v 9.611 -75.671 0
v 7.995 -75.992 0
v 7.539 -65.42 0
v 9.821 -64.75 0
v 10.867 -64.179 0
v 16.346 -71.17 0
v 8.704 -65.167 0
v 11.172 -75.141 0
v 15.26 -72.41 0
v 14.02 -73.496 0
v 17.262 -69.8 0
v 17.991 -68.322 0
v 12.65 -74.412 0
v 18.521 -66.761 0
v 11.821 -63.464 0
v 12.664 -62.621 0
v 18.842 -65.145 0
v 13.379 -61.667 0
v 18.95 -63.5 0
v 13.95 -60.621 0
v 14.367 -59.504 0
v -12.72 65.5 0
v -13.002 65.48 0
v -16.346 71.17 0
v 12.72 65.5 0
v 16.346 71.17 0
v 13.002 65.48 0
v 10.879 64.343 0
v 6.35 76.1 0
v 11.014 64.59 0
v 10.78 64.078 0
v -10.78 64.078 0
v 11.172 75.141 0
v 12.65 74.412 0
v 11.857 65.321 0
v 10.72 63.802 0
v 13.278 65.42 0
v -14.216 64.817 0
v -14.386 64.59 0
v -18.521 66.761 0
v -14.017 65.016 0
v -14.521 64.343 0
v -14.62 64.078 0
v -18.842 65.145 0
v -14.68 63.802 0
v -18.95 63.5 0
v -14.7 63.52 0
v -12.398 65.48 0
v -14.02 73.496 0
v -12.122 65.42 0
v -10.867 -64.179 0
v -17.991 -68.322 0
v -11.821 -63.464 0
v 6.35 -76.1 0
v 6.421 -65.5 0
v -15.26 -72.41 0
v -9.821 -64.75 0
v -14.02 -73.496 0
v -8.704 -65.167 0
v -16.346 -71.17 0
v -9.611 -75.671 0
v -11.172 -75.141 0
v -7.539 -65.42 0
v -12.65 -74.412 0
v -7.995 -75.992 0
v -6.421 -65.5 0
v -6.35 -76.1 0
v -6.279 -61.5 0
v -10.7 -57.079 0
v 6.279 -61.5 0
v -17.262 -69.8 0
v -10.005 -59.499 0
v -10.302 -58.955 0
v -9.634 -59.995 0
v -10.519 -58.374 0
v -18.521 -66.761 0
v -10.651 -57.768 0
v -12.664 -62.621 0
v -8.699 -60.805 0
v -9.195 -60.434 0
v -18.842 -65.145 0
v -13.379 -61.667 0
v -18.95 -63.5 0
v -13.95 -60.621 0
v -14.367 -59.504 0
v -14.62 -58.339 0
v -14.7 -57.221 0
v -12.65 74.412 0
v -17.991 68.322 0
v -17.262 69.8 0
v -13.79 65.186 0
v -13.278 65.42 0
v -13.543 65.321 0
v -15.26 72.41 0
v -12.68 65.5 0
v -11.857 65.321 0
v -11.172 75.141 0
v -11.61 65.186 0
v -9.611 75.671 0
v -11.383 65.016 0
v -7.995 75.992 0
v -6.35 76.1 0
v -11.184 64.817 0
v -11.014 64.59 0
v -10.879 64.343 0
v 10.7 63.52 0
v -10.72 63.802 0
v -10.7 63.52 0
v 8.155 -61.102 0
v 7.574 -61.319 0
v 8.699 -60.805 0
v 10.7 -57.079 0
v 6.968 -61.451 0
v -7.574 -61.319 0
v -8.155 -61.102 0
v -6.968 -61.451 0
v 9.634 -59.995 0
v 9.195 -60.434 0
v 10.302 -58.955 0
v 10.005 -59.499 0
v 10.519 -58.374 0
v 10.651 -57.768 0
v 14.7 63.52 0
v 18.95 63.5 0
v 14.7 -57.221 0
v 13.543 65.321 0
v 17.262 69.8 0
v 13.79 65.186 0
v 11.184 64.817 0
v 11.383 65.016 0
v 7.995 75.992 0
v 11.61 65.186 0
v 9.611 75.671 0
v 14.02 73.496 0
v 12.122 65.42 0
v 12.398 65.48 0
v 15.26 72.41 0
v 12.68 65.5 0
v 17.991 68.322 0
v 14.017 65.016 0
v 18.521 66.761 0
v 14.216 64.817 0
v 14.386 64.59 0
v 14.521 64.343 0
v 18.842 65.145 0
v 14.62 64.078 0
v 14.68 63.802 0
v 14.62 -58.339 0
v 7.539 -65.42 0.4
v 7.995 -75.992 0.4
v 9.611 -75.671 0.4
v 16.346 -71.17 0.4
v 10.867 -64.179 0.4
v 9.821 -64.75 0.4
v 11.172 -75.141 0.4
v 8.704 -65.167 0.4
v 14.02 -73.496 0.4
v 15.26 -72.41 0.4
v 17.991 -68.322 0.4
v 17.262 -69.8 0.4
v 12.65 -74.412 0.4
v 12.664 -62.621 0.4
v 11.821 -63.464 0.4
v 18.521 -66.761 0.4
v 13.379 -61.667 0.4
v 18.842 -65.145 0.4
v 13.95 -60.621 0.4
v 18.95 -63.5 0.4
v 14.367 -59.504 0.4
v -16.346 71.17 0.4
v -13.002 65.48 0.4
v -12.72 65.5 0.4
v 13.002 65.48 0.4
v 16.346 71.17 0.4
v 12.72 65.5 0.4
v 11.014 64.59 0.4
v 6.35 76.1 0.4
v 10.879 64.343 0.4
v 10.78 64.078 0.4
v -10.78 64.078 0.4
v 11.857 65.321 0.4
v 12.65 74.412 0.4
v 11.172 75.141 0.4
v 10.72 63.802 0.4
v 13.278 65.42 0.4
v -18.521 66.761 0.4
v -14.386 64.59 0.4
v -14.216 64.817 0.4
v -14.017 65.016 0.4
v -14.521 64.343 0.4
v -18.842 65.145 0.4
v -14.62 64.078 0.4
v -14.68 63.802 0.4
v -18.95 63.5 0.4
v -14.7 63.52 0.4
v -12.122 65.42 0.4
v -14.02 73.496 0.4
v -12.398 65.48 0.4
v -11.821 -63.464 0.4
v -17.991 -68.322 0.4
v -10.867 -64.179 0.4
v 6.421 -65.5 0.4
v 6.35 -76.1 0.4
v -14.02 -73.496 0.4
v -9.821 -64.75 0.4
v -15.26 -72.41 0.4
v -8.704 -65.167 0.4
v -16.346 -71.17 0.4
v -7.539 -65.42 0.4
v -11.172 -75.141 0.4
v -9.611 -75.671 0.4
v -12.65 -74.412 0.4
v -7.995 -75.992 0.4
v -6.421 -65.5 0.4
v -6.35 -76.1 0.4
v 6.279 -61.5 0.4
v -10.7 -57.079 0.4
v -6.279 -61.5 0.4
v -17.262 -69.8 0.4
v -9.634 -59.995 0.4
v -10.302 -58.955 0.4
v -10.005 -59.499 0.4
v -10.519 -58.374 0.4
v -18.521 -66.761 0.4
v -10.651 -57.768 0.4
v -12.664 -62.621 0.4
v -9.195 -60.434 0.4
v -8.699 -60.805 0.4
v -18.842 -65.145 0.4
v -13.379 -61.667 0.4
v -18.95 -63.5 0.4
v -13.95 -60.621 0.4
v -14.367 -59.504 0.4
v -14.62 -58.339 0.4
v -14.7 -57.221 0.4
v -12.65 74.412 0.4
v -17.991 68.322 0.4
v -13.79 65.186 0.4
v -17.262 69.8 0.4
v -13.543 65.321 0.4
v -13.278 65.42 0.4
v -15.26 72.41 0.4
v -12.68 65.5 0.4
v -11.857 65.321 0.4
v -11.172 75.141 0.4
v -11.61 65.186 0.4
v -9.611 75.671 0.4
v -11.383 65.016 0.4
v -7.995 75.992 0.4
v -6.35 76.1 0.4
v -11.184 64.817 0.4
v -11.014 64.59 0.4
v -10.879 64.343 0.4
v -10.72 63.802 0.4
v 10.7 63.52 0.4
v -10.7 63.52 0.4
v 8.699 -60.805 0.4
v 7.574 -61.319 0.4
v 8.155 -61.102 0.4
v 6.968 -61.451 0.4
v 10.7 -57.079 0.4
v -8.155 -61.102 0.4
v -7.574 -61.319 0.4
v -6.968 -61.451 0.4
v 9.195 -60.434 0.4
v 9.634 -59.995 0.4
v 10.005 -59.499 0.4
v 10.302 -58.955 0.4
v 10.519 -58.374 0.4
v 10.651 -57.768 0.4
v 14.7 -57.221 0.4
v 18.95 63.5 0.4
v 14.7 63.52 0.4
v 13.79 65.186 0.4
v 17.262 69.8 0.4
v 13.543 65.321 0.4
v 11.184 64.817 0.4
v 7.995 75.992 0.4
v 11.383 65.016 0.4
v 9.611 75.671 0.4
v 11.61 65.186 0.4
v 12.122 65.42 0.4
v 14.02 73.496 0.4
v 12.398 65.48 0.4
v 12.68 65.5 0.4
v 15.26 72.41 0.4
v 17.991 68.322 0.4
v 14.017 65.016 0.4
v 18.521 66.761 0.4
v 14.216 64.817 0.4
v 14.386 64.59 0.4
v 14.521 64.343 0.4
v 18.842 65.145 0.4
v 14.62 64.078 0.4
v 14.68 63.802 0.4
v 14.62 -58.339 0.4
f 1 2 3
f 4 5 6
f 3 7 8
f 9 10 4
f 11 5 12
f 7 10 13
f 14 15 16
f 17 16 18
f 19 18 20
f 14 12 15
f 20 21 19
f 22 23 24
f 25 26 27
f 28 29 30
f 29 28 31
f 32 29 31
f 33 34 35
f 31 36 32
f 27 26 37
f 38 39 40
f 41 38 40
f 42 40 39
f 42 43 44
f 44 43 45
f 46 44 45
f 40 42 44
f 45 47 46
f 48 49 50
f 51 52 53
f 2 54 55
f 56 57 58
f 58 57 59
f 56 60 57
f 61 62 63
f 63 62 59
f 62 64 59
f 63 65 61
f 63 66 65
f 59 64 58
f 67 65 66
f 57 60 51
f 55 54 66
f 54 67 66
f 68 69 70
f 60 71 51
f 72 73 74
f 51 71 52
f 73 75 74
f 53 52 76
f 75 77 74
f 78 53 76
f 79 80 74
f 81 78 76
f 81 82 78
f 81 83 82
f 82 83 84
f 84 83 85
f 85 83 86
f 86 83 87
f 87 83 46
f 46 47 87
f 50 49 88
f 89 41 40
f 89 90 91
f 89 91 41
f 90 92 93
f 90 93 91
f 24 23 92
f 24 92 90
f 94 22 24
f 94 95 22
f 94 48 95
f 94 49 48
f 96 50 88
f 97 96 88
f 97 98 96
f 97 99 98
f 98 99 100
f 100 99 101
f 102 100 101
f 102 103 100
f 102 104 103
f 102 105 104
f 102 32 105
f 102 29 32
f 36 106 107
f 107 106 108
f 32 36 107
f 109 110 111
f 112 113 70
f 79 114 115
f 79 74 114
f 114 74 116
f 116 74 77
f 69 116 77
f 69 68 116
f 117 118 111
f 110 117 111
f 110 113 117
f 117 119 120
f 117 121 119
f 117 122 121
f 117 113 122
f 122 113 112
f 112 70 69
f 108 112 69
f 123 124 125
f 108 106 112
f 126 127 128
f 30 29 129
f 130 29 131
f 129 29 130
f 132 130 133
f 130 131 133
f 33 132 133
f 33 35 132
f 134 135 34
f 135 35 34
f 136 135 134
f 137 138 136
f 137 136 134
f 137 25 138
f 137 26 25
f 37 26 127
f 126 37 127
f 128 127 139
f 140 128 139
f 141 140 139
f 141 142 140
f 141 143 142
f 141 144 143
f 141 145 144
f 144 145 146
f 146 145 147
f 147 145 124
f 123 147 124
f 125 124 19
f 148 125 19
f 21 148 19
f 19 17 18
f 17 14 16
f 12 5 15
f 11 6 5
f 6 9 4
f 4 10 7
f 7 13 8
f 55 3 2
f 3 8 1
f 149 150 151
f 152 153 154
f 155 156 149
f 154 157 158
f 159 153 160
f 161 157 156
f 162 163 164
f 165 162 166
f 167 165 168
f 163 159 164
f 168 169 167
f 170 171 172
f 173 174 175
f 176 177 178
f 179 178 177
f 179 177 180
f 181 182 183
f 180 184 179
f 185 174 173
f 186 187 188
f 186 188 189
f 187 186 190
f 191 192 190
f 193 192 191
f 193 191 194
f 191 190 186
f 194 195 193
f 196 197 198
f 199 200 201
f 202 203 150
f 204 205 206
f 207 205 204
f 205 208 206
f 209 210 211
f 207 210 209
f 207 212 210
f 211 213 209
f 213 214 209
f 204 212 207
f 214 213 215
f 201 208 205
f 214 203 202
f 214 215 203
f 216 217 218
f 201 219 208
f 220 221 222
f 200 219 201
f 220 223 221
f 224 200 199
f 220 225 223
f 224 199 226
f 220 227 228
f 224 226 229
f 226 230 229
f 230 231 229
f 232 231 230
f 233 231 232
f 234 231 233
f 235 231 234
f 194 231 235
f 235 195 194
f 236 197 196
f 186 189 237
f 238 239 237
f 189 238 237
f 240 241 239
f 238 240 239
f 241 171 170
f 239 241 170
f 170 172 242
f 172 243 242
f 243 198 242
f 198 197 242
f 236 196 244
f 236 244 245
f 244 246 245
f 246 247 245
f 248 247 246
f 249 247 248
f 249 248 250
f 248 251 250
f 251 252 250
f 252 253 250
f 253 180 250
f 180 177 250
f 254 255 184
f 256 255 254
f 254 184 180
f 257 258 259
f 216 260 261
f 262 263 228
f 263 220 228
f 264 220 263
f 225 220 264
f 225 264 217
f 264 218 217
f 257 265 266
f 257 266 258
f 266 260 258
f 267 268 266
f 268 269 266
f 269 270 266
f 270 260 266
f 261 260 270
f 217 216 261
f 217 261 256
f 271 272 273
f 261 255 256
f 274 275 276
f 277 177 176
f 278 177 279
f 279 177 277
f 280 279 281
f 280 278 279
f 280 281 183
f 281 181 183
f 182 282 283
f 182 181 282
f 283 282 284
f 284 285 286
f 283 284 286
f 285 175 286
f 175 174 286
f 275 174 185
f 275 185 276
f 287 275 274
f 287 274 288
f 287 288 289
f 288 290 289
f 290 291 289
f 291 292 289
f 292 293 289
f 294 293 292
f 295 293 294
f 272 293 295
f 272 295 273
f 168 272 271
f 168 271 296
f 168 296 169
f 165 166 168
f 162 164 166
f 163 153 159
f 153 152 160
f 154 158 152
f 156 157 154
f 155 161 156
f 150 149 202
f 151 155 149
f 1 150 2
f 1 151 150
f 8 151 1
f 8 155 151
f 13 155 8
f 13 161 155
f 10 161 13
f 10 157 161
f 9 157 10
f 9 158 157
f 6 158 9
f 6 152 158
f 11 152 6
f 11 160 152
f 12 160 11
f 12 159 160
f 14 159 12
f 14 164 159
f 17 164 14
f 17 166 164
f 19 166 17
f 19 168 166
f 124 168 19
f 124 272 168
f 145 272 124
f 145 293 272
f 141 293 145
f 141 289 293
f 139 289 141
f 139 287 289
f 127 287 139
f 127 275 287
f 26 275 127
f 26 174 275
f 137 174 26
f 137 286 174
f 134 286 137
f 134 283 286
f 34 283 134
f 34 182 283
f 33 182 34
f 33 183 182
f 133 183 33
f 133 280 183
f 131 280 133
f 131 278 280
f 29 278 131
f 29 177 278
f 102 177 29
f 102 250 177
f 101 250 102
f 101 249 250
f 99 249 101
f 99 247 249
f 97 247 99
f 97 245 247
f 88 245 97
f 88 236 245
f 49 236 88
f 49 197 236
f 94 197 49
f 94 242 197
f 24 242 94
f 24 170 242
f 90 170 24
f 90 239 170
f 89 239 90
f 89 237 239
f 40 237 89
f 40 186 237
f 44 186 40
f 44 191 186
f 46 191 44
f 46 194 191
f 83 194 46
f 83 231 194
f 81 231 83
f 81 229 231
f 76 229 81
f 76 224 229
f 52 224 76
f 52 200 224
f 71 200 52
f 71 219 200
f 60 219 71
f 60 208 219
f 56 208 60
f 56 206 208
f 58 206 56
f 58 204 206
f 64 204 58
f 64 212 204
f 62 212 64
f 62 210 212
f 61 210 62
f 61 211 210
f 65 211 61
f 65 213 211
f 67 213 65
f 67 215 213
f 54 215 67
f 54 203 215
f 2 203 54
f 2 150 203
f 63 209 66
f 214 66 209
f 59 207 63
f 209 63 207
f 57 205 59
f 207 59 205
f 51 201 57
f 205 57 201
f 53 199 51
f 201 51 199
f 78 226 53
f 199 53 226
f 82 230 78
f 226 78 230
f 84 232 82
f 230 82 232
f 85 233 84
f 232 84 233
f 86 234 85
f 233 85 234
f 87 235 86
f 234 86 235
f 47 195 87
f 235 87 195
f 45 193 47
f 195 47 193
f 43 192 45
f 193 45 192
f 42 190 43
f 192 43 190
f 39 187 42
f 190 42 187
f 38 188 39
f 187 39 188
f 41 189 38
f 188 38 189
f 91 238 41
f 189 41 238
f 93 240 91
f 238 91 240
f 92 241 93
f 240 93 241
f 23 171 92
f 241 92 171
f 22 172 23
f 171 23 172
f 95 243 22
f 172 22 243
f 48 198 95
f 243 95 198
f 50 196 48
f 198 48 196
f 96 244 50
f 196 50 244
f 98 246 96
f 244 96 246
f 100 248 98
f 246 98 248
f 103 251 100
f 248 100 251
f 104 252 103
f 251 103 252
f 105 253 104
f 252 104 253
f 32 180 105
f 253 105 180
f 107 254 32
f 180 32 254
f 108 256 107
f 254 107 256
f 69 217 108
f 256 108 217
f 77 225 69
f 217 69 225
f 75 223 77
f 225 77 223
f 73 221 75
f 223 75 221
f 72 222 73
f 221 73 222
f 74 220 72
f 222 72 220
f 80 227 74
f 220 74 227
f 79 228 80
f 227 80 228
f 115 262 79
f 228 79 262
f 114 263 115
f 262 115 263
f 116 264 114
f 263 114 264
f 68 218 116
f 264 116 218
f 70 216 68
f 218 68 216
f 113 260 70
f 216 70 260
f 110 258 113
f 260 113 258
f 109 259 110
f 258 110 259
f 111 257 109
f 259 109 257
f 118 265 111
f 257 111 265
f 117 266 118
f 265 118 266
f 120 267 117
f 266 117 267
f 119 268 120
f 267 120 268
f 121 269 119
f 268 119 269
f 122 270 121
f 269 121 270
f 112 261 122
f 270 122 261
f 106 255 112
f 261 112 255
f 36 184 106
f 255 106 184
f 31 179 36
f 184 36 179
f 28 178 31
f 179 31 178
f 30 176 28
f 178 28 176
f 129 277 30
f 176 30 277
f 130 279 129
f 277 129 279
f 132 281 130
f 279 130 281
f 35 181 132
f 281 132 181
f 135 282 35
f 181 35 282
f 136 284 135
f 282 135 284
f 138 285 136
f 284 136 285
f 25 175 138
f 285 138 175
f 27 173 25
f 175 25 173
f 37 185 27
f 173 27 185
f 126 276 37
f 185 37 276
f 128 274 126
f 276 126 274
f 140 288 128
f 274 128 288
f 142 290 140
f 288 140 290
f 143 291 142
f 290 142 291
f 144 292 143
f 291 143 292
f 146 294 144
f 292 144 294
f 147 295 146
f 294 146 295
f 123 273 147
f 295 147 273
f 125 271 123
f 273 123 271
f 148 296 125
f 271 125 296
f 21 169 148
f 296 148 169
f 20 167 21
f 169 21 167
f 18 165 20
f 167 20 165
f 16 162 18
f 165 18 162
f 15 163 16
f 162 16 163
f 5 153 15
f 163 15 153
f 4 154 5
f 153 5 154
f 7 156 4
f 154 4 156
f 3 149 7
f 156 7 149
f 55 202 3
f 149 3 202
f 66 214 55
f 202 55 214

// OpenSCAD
// file: ../lib/TOGUnitTable-v1.scad
// TOGUnitTable-v1.1.0 - Library for handling 'complex amounts' in the form of [multiplier, unit name], e.g. [1.5, "inch"]
//
// 2023-07-01: the following 'annotation' is something I just made up,
// but is intended as a way for future packaging tools to know that it's 'safe'
// (because everything has been somewhat namespaced) to turn a `use <x>`
// into an `include <x>`, making it inlinable:
// safe-to-include: true
// 
// Versions:
// v1.0.0:
// - Created it.
// v1.1.0:
// - Add optional 'dbgctxstr' parameter to unit decoding functions, for better error messages
// 
// Naming convention:
// Doing 'OO without classes', here.
// Fully qualified name = class or package name + "__" + member name
// Class or package name may itself be namespaced, and class names may double as package names.
// Here, tog_unittable names both a class and a package.

// Demo unit table uses 'micrometer' as the base unit
// in order to keep multipliers as integers as much as possible.
tog_unittable__demo_unit_table = [
	["um",    [    1   ,   "um"], "micrometer" ],
	["mm",    [ 1000   ,   "um"], "millimeter" ],
	["inch",  [25400   ,   "um"], "inch"       ],
	["u",     [    1/16, "inch"], "model unit" ], // As used by TGx9 et al
	["atom",  [    8   ,    "u"], "model atom" ],
	["chunk", [    3   , "atom"], "model chunk"],
];

use <./DbgCtxStrLib1.scad>

function tog_unittable__list__filter(list, predicate) = [
	for( item=list ) if( predicate(item) ) item
];
function tog_unittable__list__first(list, on_error) =
	len(list) > 0 ? list[0] : on_error();

function tog_unittable__unit_value_ca(unit_table, unit_name, dbgctxstr=undef) =
	tog_unittable__list__first(
		tog_unittable__list__filter(unit_table, function (entry) entry[0] == unit_name),
		function () assert(false,
			str("Did not find entry for unit '", unit_name, "' in unit table", dbgctxstr_errmsg_suffix(dbgctxstr))
		)
	)[1];

function tog_unittable__ca__is_valid( ca ) =
	is_list(ca) && len(ca) == 2;

// Break down 'amount' until it is in a base unit (one which is defined in terms of itself)
function tog_unittable__simplify_ca(unit_table, amount, dbgctxstr=undef) =
	assert( tog_unittable__ca__is_valid(amount), str(amount, " is not a valid Complex Amount (should be [numeric_value, \"unit_name\"])", dbgctxstr=dbgctxstr) )
	let( unit_value_ca = tog_unittable__unit_value_ca(unit_table, amount[1], dbgctxstr=dbgctxstr) )
	unit_value_ca[1] == amount[1] ? amount :
		tog_unittable__simplify_ca(unit_table, [amount[0] * unit_value_ca[0], unit_value_ca[1]]);

function tog_unittable__divide_ca(unit_table, numerator, denominator, dbgctxstr=undef) =
	let(
		numerator_base_ca   = tog_unittable__simplify_ca(unit_table, numerator, dbgctxstr=dbgctxstr),
		denominator_base_ca = tog_unittable__simplify_ca(unit_table, denominator, dbgctxstr=dbgctxstr)
	)
	assert(numerator_base_ca[1] == denominator_base_ca[1], str("Different base units found for ", numerator[1], " and ", denominator[1]))
	numerator_base_ca[0] / denominator_base_ca[0];	

assert(tog_unittable__divide_ca(tog_unittable__demo_unit_table, [1,   "mm"], [  1, "mm"]) ==     1   );
assert(tog_unittable__divide_ca(tog_unittable__demo_unit_table, [1,   "mm"], [  1, "um"]) ==  1000   );
assert(tog_unittable__divide_ca(tog_unittable__demo_unit_table, [1, "inch"], [  1, "um"]) == 25400   );
assert(tog_unittable__divide_ca(tog_unittable__demo_unit_table, [1, "inch"], [  1, "mm"]) ==    25.4 );
assert(tog_unittable__divide_ca(tog_unittable__demo_unit_table, [1, "inch"], [254, "um"]) ==   100   );
assert(tog_unittable__divide_ca(tog_unittable__demo_unit_table, [1,    "u"], [  1, "um"]) ==  1587.5 );
// file: ../lib/TOGStringLib1.scad
// TOGStringLib1.7
// 
// Functions for parsing quantities
// and other misc. string handling.
// 
// v1.5
// - togstr1_parse_quantity will treat unit-only strings as meaning 1/1 of that unit.
//   e.g. togstr1_parse_quantity("foot") = [[[1,1], "foot", 4]]
// v1.6:
// - togstr1_parse_quantity allows unit name to be omitted when quantity is zero and $togunits1_default_unit is defined
// v1.7:
// - Add optional 'dbgctxstr' parameter to unit decoding functions, for better error messages
// 
// Globals: $togunits1_default_unit - affects what 'unit' is returned
// when interpreting numbers or strings that lack the unit.


function togstr1__todo(message) = assert(false, str("TODO: ", message));

module togstr1__assert_eq(a, b) {
	if( a != b ) {
		assert( a == b, str(a, " != ", b) );
	}
}



function togstr1_slice(source, i0, i1) =
	i0 == i1 ? "" :
	str(source[i0], togstr1_slice(source, i0+1, i1));

function togstr1_tokenize(source, sep, maxcount=9999, i=0, tokenstart=0) =
	len(source) == i ? (
		(tokenstart < i) ? [togstr1_slice(source, tokenstart, i)] : []
	) :
	source[i] == sep ? (
		(tokenstart < i) ? concat([togstr1_slice(source, tokenstart, i)], togstr1_tokenize(source, sep, maxcount-1, i+1, i+1)) :
		togstr1_tokenize(source, sep, maxcount, i+1, i+1)
	) :
	maxcount <= 1 ? [togstr1_slice(source, tokenstart, len(source))] :
	togstr1_tokenize(source, sep, maxcount, i+1, tokenstart);

togstr1__assert_eq( ["foo","bar","baz"], togstr1_tokenize("foo-bar-baz", "-") );
// Duplicate delimiters are ignored
togstr1__assert_eq( ["foo","bar","baz"], togstr1_tokenize("foo--bar--baz", "-") );
// Trailing delimiters are ignored
togstr1__assert_eq( ["foo","bar","baz"], togstr1_tokenize("foo--bar--baz--", "-") );
// Leading delimiters are ignored
togstr1__assert_eq( ["foo","bar","baz"], togstr1_tokenize("--foo--bar--baz", "-") );
// Can limit number of tokens returned
togstr1__assert_eq( ["foo","bar-baz"], togstr1_tokenize("foo-bar-baz", "-", 2) );
togstr1__assert_eq( ["foo","bar-baz"], togstr1_tokenize("--foo--bar-baz", "-", 2) );
togstr1__assert_eq( ["foo","bar--baz"], togstr1_tokenize("--foo--bar--baz", "-", 2) );
togstr1__assert_eq( ["foo"], togstr1_tokenize("--foo--", "-", 2) );




/** \d+ -> [num, end_index] */
function togstr1_parse_decimal_nat(str, index=0, current=0, dbgctxstr=undef) =
	len(str) == index ? [current, index] :
	let( dig = ord(str[index]) - ord("0") )
	(dig >= 0 && dig <= 9) ? togstr1_parse_decimal_nat(str, index+1, current*10 + dig, dbgctxstr=dbgctxstr) :
	[current, index];

togstr1__assert_eq( [123,3], togstr1_parse_decimal_nat("123") );
togstr1__assert_eq( [123,3], togstr1_parse_decimal_nat("123.45") );

/** [+-]*\d+ ->  [[num, den], end_index] */
function togstr1_parse_decimal_number(str, index=0, dbgctxstr=undef) =
	str[index] == "+" ? togstr1_parse_decimal_number(str, index+1) :
	str[index] == "-" ? let(r=togstr1_parse_decimal_number(str, index+1)) [[-r[0][0], r[0][1]], r[1]] :
	let(r = togstr1_parse_decimal_nat(str, index, dbgctxstr=dbgctxstr))
	str[r[1]] != "." ? [[r[0], 1], r[1]] :
	let(fracr = togstr1_parse_decimal_nat(str, r[1]+1))
	let(mult = pow(10, fracr[1]-(r[1]+1)))
	[[r[0]*mult + fracr[0], mult], fracr[1]];

togstr1__assert_eq( [[   36,   1], 2], togstr1_parse_decimal_number( "36"   ) );
togstr1__assert_eq( [[ 3524, 100], 5], togstr1_parse_decimal_number( "35.24") );
togstr1__assert_eq( [[-3524, 100], 6], togstr1_parse_decimal_number("-35.24") );
togstr1__assert_eq( [[    0,   1], 0], togstr1_parse_decimal_number( "NotANumber") );

function togstr1__gcd(a, b) = b == 0 ? abs(a) : togstr1__gcd(b, a % b);

togstr1__assert_eq(10, togstr1__gcd(10, 20));
togstr1__assert_eq( 5, togstr1__gcd(10, 15));
togstr1__assert_eq( 2, togstr1__gcd(10, 14));


function togstr1__normalize_rat(rat) =
	let(gcd = togstr1__gcd(rat[0], rat[1]))
	// TODO: find LCD, divide top and bottom by it
	rat[0] < 0 && rat[1] < 0 ? [-rat[0]/gcd, -rat[1]/gcd] :
	[rat[0]/gcd, rat[1]/gcd];

/** <decnum>[/<decnum>] -> [[num, den], end_index] */
function togstr1__multiply_rat(a, b) =
	togstr1__normalize_rat(
		a[1] == b[1] ? [a[0]*b[0]/a[1], a[1]] : // TODO: LCD instead of special case
		[a[0]*b[0], a[1]*b[1]]
	);
function togstr1__divide_rat(a, b) = togstr1__normalize_rat([a[0]*b[1], a[1]*b[0]]);


function togstr1__add_rat(a, b) =
	togstr1__normalize_rat([a[0]*b[1] + b[0]*a[1], a[1]*b[1]]);
	
togstr1__assert_eq([1, 2], togstr1__add_rat([1, 3], [1, 6]));


/** Return [[num, den], end_index] */
function togstr1_parse_rational_number(str, index=0, dbgctxstr=undef) =
	let( numr = togstr1_parse_decimal_number(str, index, dbgctxstr=dbgctxstr) )
	str[numr[1]] == "+" ?
		let(numrb = togstr1_parse_rational_number(str, numr[1]+1, dbgctxstr=dbgctxstr))
		[togstr1__add_rat(numr[0], numrb[0]), numrb[1]]	:
	str[numr[1]] == "/" ?
		let( denr = togstr1_parse_decimal_number(str, numr[1]+1, dbgctxstr=dbgctxstr) )
		[togstr1__divide_rat(numr[0], denr[0]), denr[1]] :
	numr;

togstr1__assert_eq( [[   123,  1],3], togstr1_parse_rational_number( "123") );
togstr1__assert_eq( [[   123,  1],4], togstr1_parse_rational_number("+123") );
togstr1__assert_eq( [[-  123,  1],4], togstr1_parse_rational_number("-123") );
togstr1__assert_eq( [[   123,  1],6], togstr1_parse_rational_number("-+-123") );
togstr1__assert_eq( [[ 12345,100],6], togstr1_parse_rational_number("123.45") );
togstr1__assert_eq( [[  2469, 40],8], togstr1_parse_rational_number("123.45/2") );
togstr1__assert_eq( [[-  823,160],10], togstr1_parse_rational_number("-123.45/24") );
togstr1__assert_eq( [[     4,  3],5], togstr1_parse_rational_number( "1+1/3") );
togstr1__assert_eq( [[     0,  1],0], togstr1_parse_rational_number( "NotANumber!!") );


/** Return [[[num, den], unit], end_index] */
function togstr1_parse_quantity(str, dbgctxstr=undef) =
	let( numr = togstr1_parse_rational_number(str, dbgctxstr=dbgctxstr) )
	// For now, just let the unit be the rest of the string;
	// can revisit to stop at delimiters if needed in the future.
	numr[1] > 0 && numr[1] == len(str) && numr[0][0] == 0 && !is_undef($togunits1_default_unit) ? [[[0,1], $togunits1_default_unit], numr[1]] :
	assert( numr[1] < len(str), str("Quantity string missing unit: '", str, "'; note that '0' is acceptable if $togunits1_default_unit is defined"))
	let( unit = togstr1_slice(str, numr[1], len(str)) )
	let( quant = numr[1] > 0 ? numr[0] : [1,1] ) // No number = 1 (possibly this should be an error instead)
	[[quant, unit], len(str)];

togstr1__assert_eq( [[[  3,  1], "acre"],  5], togstr1_parse_quantity("3acre") );
togstr1__assert_eq( [[[  3,  5], "acre"],  7], togstr1_parse_quantity("3/5acre") );
togstr1__assert_eq( [[[301,500], "acre"], 10], togstr1_parse_quantity("3.01/5acre") );
togstr1__assert_eq( [[[  1,  1], "acre"],  4], togstr1_parse_quantity("acre") ); // Should either treat as one or throw an error!
togstr1__assert_eq( [[[  0,  1],"hectare"],1], togstr1_parse_quantity("0", $togunits1_default_unit="hectare") ); // Zero is fine if $togunits1_default_unit is defined
// file: ../lib/TOGridLib3.scad
// TOGridPileLib-v3.4
// 
// HOKAY WHAT ARE THE COMMON
// things that I want the library to do?
// 
// - [X] Be `include`-able, to make inlining easy
// - [X] Allow unit table to be overridden easily, but default by default
// - [ ] Support common configurations by name (e.g. "V9", or some "WSTYPE-...")
//   without having to pass 50 different parameters in
// - [ ] Support subtractions for those common configurations also,
//   such that you don't need to remember to 'do less rounding', etc.
// - [ ] Make a simple foot-only block that I can subtract stuff from
//   params: foot style
// - [ ] Make a block with a lip
// - [ ] Make a block foot, and I'll intersect it with some other things
// - [X] Translate a block_size_ca to mm
// 
// Changes:
// v3.1:
// - s/togridpile3_decode_size/togridpile3_decode_vector/
// v3.2:
// - togridpile3_decode(num) = num
// v3.3:
// - Change prefix from `togridpile3` to `togridlib3`
// v3.4:
// - Add optional 'dbgctxstr' parameter to unit decoding functions, for better error messages

use <../lib/TOGUnitTable-v1.scad>

function togridlib3_map(arr, fn) = [ for(item=arr) fn(item) ];

togridlib3_default_unit_table = [
	["um",    [    1,               "um"]],
	["mm",    [ 1000,               "um"]],
	["inch",  [25400,               "um"]],
	["u",     [    1.5875,          "mm"]],
	["atom",  [    8,                "u"]],
	["chunk", [    3,             "atom"]],
	["tgp-standard-bevel"   , [2,    "u"]], // Usuually 1/8"
	["m-outer-corner-radius", [4,    "u"]],
	["f-outer-corner-radius", [3,    "u"]],
];

function togridlib3_get_default_unit_table() = togridlib3_default_unit_table;
function togridlib3_get_unit_table() = is_undef($togridlib3_unit_table) ? togridlib3_default_unit_table : $togridlib3_unit_table;

function togridlib3_decode(dim, unit=[1, "mm"], unit_table=togridlib3_get_unit_table(), dbgctxstr=undef) =
	is_num(dim) ? dim : tog_unittable__divide_ca(unit_table, dim, unit, dbgctxstr=dbgctxstr);
function togridlib3_decode_vector(size, unit=[1, "mm"], unit_table=togridlib3_get_unit_table(), dbgctxstr=undef) =
	togridlib3_map(size, function(dim) is_num(dim) ? dim : tog_unittable__divide_ca(unit_table, dim, unit, dbgctxstr=dbgctxstr));

module togridlib3_cube(size, offset=0) {
	cube(togridlib3_decode_vector(size), center=true);
}
// file: ../lib/DbgCtxStrLib1.scad
// DbgCtxStrLib1.0
// 
// Library for dealing with 'debug context strings' (usually 'dbgctxstr').

function dbgctxstr_errmsg_suffix(dbgctxstr) =
	is_undef(dbgctxstr) || dbgctxstr == "" ? "" :
	str(" (", dbgctxstr, ")");
// file: ../lib/TOGComplexLib1.scad
function tcplx1_multiply(a, b) =
	[a[0]*b[0] - a[1]*b[1], a[0]*b[1] + a[1]*b[0]];
function tcplx1_divide(a, b) =
	let(bot = (b[0]*b[0] + b[1]*b[1]))
	[
		(a[0]*b[0] + a[1]*b[1])/bot,
		(a[1]*b[0] - a[0]*b[1])/bot
	];

assert([-11,23] == tcplx1_multiply([3,2], [1,7]));

assert([-1,3] == tcplx1_multiply([3,1], [0,1]));
assert([-1,3] == tcplx1_multiply([0,1], [3,1]));

echo(tcplx1_divide([-1,3], [3,1]));
assert([0,1] == tcplx1_divide([-1,3], [3,1]));

function tcplx1_normalize(vec) =
	let(veclen = sqrt(vec[0]*vec[0]+vec[1]*vec[1]))
	[vec[0] / veclen, vec[1] / veclen];

function tcplx1_relative_turnvec_vv(v0, v1) =
	tcplx1_divide(tcplx1_normalize(v1), tcplx1_normalize(v0));

function tcplx1_relative_turnvec_abc(p0, p1, p2) = tcplx1_relative_turnvec_vv(p1-p0, p2-p1);

// A 90-degree turn
assert([0,1] == tcplx1_relative_turnvec_abc([0,0], [1,0], [1,1]));
assert([0,1] == tcplx1_relative_turnvec_abc([0,0], [0,1], [-1,1]));

// A 45-degree turn
assert(tcplx1_normalize([1,1]) == tcplx1_relative_turnvec_abc([0,0], [1,0], [ 2,1]));
assert(tcplx1_normalize([1,1]) == tcplx1_relative_turnvec_abc([0,0], [0,1], [-1,2]));


function tcplx1_relative_angle_abc(p0, p1, p2) =
	let(turnvec = tcplx1_relative_turnvec_abc(p0, p1, p2))
	atan2(turnvec[1], turnvec[0]);

assert(-135 == tcplx1_relative_angle_abc([0,0], [1,0], [0,-1]));
assert( -90 == tcplx1_relative_angle_abc([0,0], [1,0], [1,-1]));
assert(   0 == tcplx1_relative_angle_abc([0,0], [1,0], [2, 0]));
assert(  90 == tcplx1_relative_angle_abc([0,0], [1,0], [1, 1]));
assert( 135 == tcplx1_relative_angle_abc([0,0], [1,0], [0, 1]));

assert(  90 == tcplx1_relative_angle_abc([1,1], [3,3], [1, 5]));
// file: ../lib/TOGArrayLib1.scad
// TOGArrayLib1.5
// 
// Functions for working with arrays.
// 
// v1.1:
// - tal1_reduce assert(is_list(items)) to prevent infinite recursion
//   when given undefined or other non-list values
// v1.1.1:
// - Fix tal1_uniq_remap_v2 to return "list-remap-result" as the
//   first element of the returned list
// v1.2:
// - Add tal1_replace_at function
// v1.3:
// - tal1_is_vec_of, tal1_is_vec_of_num
// v1.4:
// - tal1_assert_for_each, for when you want to assert something
//   about each of a list of items and get nice failure messages
// v1.5:
// - Add tal1_duplicate_reversed function, which may be
//   handy when generating symmetrical polygons and stuff.

/**
 * Make a list with the contents of list `a`,
 * but starting at offset `off`, replaced by the contents of list `b`.
 * len(result) = max(len(a), off+len(b))
 */
function tal1_replace_at(a, off, b, default_value=undef, default_value_function=undef) =
	assert(is_list(a))
	assert(is_list(b))
	let( _dvf = !is_undef(default_value_function) ? default_value_function : function(i) default_value )
[
	for( i=[0:1:min(off,len(a))-1] ) a[i],
	for( i=[len(a):1:off-1] ) _dvf(i),
	for( i=[off:1:off+len(b)-1] ) b[i-off],
	for( i=[off+len(b):1:len(a)-1] ) a[i],
];

// Simplest case
assert([] == tal1_replace_at([], 0, []));
// Second simplest cases
assert(["foo"] == tal1_replace_at(["foo"], 0, []));
assert(["foo"] == tal1_replace_at([], 0, ["foo"]));
// Replace one item
assert(["foo","quux","baz"] == tal1_replace_at(["foo","bar","baz"], 1, ["quux"]));
// Replace and extend
assert(["foo","quux","tuna","tina"] == tal1_replace_at(["foo","bar","baz"], 1, ["quux", "tuna", "tina"]));
// Add beyond end of `a`
assert(["foo","zzz","quux"] == tal1_replace_at(["foo"], 2, ["quux"], default_value="zzz"));
// Adding 'nothing' should still fill to that point with defaults
assert(["foo","zzz","zzz"] == tal1_replace_at(["foo"], 3, [], default_value="zzz"));


function tal1_reduce(start, items, func, offset=0) =
	assert(is_list(items))
	len(items) == offset ? start :
	tal1_reduce(func(start, items[offset]), items, func, offset+1);

function tal1_consecutive_duplicate_count(items) = tal1_reduce(
	[0, undef],
	items,
	function(z,item) [z[0] + (item == z[1] ? 1 : 0), item]
)[0];

assert(0 == tal1_consecutive_duplicate_count([]));
assert(0 == tal1_consecutive_duplicate_count([50]));
assert(1 == tal1_consecutive_duplicate_count([50,50]));
assert(0 == tal1_consecutive_duplicate_count([50,51,52,53]));
assert(1 == tal1_consecutive_duplicate_count([50,51,52,52]));
assert(3 == tal1_consecutive_duplicate_count([50,50,50,50]));

// Set test_size to arbirarily large values
// to ensure that OpenSCAD can handle heavy recursion
let(test_size=1000) assert(test_size/2 == tal1_consecutive_duplicate_count([for(i=[0:1:test_size-1]) floor(i/2)]));



function tal1_uniq_(items, off0, off1) =
	let(chunklen = off1-off0)
	chunklen == 0 ? [] :
	chunklen == 1 ? [items[off0]] :
	let(half=floor(chunklen/2))
	let(left  = tal1_uniq_(items, off0     , off0+half))
	let(right = tal1_uniq_(items, off0+half, off1     ))
	assert(len(left) > 0)
	assert(len(right) > 0)
	left[len(left)-1] == right[0] ? [each left, for(i=[1:1:len(right)-1]) right[i]] :
	[each left, each right];

/** Given a list of items, returns a new list with identical consecutive items merged */
function tal1_uniq(items) = tal1_uniq_(items, 0, len(items));

assert([] == tal1_uniq([]));
assert([123] == tal1_uniq([123]));
assert([55,0,1,2,3] == tal1_uniq([55,0,1,2,3]));
assert([55,0,1,2] == tal1_uniq([55,0,1,1,2]));
assert([55,0,1] == tal1_uniq([55,55,0,0,0,0,0,0,1,1,1,1]));
assert([55,0] == tal1_uniq([55,0,0,0,0,0,0,0]));



/**
 * Returns [new items, old index -> new index mapping].
 * No-op version.
 */
function tal1_uniq_remap_v1(items) =
	["list-remap-result", items, [for (vi=[0:1:len(items)-1]) vi]];

// [a, a, b, b, c, c]
//
// [a,    ...], []  -> [a],[0]
// [a, a, ...], [0] -> [a],[0,0]

assert([1,2,3] == [1,2,3]);

/**
 * Recursive version that will combine adjacent identical vertexes,
 * but will use the original items.
 */
function tal1_uniq_remap_v2(items, map=[]) =
	let(index = len(map))
	len(items) == index ? ["list-remap-result", items, map] :
	index == 0 ? tal1_uniq_remap_v2(items, [0]) :
	items[index] == items[map[index-1]] ? tal1_uniq_remap_v2(items, [for(vi=map) vi, map[index-1]]) :
	tal1_uniq_remap_v2(items, [for(vi=map) vi, index]);

assert(tal1_uniq_remap_v2([1,1,2,2,3,4]) == ["list-remap-result", [1,1,2,2,3,4], [0,0,2,2,4,5]]);


/**
 * Returns true if `vec` is a list of at least min_len items
 * and component_check(each item, even those beyond min_len) is true.
 */
function tal1_is_vec_of(vec, min_len=0, component_check=function(x) true) =
	assert(is_num(min_len) && min_len >= 0)
	assert(is_function(component_check))
	is_list(vec) && len(vec) >= min_len &&
	tal1_reduce(true, vec, function(prev,item) prev && component_check(item));

function tal1_is_vec_of_num(vec, min_len=0) = tal1_is_vec_of(vec, min_len, function(i) is_num(i));

assert( true == tal1_is_vec_of_num([1,2,3]));
assert( true == tal1_is_vec_of_num([]));
assert( true == tal1_is_vec_of_num([1,2,3], 3));
assert(false == tal1_is_vec_of_num([1,2], 3));
assert(false == tal1_is_vec_of_num([1,2,"spoon"], 3));
// Requirements are ambiguous when
// first min_len items are numbers, but there are non-numeric items afterwards,
// so let's error on the side of saying 'no, it's not a list of numbers';
// i.e. the item check and the min_len are independent.
assert(false == tal1_is_vec_of_num([1,2,3,"artichoke"], 3));


/**
 * Asserts that item_checker(each item in list, index of item)[0] is true.
 * Second element of item_checker return value is assertion message.
 * Returns the original list, in case that's useful to you.
 */
function tal1_assert_for_each(list, item_checker) =
	let( _ignored = [ for(i=[0:1:len(list)-1])
		let(q=item_checker(list[i],i))
		let(passed=is_bool(q) ? q : is_list(q) ? q[0] : assert(false, str(
			"tal1_assert_for_each: item_checker should return Bool|[Bool,String], but returned ",
			q, " for item at index ", i)))
		let(message=is_list(q) ? q[1] : undef)
		assert(passed, message)
		q
	])
	list;

// Callback can return a boolean...
assert([1,2,3] == tal1_assert_for_each([1,2,3], function(v,i) is_num(v)));
// ...or a [boolean, string]
assert([1,2,3] == tal1_assert_for_each([1,2,3], function(v,i) [is_num(v), "element be a num"]));

// [a, b, c] -> [a, b, c, rxf(c), rxf(b), rxf(a)]
function tal1_duplicate_reversed(list, rxf=function(item) item) =
	[
		each list,
		for( i=[len(list)-1 : -1 : 0] ) rxf(list[i]),
	];
// file: ../lib/TOGUnits1.scad
// TOGUnits1.7
// 
// For simlifying quantity parsing and unit conversion
// 
// v1.1:
// - Add `togunits1_decode` function
// v1.2:
// - Add togunits1_decode_vec
// v1.3:
// - Add togunits1_vec_to_cas
// v1.4:
// - Add togunits1_vec_to_mms
// v1.5:
// - Remove unused `unit` parameter from `togunits1_vec_to_cas`
// v1.6:
// - togunits1_decode accepts `xf` parameter, same as togunits1_decode_vec
// v1.7:
// - Add optional 'dbgctxstr' parameter to unit decoding functions, for better error messages
// 
// Reserved but not-yet-actually-used globals:
// - $togunits1_default_unit - default unit when interpreting "0"
//   - See TOGStringLib1
// - $togunits1_default_implied_unit - when interpreting quantities without unit, assume they have this one
//   - This might be a bad idea, so never implemented!

use <./DbgCtxStrLib1.scad>
use <./TOGridLib3.scad>
use <./TOGStringLib1.scad>

function togunits1__is_ca(what) =
	is_list(what) && len(what) == 2 && is_num(what[0]) && is_string(what[1]);

function togunits1__parse_to_ca(what, dbgctxstr=undef) =
	assert( is_string(what) )
	let( parseresult = togstr1_parse_quantity(what, dbgctxstr) )
	assert( parseresult[1] > 0, str("Failed to parse quantity from  ", what, dbgctxstr=dbgctxstr) )
	let( parsed = parseresult[0] )
	let( rat = parsed[0] )
	let( unit = parsed[1] )
	[rat[0]/rat[1], unit];

function togunits1_to_ca(what, dbgctxstr=undef) =
	is_string(what) ? togunits1__parse_to_ca(what, dbgctxstr=dbgctxstr) :
	togunits1__is_ca(what) ? what :
	is_num(what) ? [what, "mm"] :
	assert(false, str("Unrecognized quantity representation: ", what));

function togunits1_vec_to_cas(whats) =
	[for(w=whats) togunits1_to_ca(w)];

function togunits1__get_transform(name) =
	is_function(name) ? name :
	is_undef(name) ? function(n) n :
	name == "round" ? function(n) round(n) :
	name == "ceil" ? function(n) ceil(n) :
	assert(false, str("Unrecognized transform: '", name, "'"));

function togunits1_decode(what, unit=[1,"mm"], xf=undef, dbgctxstr=undef) =
	let( ca = togunits1_to_ca(what, dbgctxstr=dbgctxstr) )
	let( xf1 = togunits1__get_transform(xf) )
	xf1(togridlib3_decode(ca, unit=togunits1_to_ca(unit), dbgctxstr=dbgctxstr));

function togunits1_decode_vec(whats, unit=[1,"mm"], xf=undef) =
	let( unit_ca = togunits1_to_ca(unit) )
	let( xf1 = togunits1__get_transform(xf) )
	[for(w=whats) xf1(togunits1_decode(w, unit_ca))];

function togunits1_to_mm(what, dbgctxstr=undef) = togunits1_decode(what, [1,"mm"], dbgctxstr=dbgctxstr);
function togunits1_vec_to_mms(what) = togunits1_decode_vec(what, [1,"mm"]);
// file: ../lib/TOGMod1Constructors.scad
// TOGMod1Constructors-v1.11
// 
// Functions to construct objects understood by TOGMod1
// 
// v1.1:
// - Add togmod1_make_rounded_rect
// v1.2:
// - togmod1_make_rounded_rect can make ovals
// v1.3:
// - togmod1_circle_points, to just get the points of a circle
// - if pos parameter to circle function has a third element,
//   returned vertexes will include it as the z component;
// v1.3.1
// - Some assertions
// v1.4:
// - Refactor togmod1_rounded_rect_points and togmod1_circle_points
//   to use togmod1__make_nd_vector_adder for adapting to whatever
//   `pos` parameter is.
// v1.5:
// - togmod_rounded_rect_points will not simplify completely rounded sides
//   (where length of side is exactly twice the rounding radius)
//   unless simplify_rounded_sides=true
//   - This makes it more useful for polyhedron generation,
//     where radius varies, but number of points must remain constant.
// v1.6:
// - togmod1_make_rect makes a simple rectangle
// - togmod1_make_rounded_rect will defer to togmod1_make_rect when r=0
// v1.7:
// - togmod1_make_circle will return empty shape (["union"]) when d=0
// v1.8:
// - Add togmod1_text
// v1.9:
// - togmod1_circle_points uses 3 as minimum circle point count instead of 6
// v1.10:
// - Fix togmod1_linear_extrude_y so that range corresponds to Y start/end and
//   polygon X,Y correspond to X,Z.  Previously it was rotated wrongly,
//   which would have gone unnoticed for symmetrical shapes centered at 0,0.
// v1.11:
// - Remove an 'echo'

use <./TOGArrayLib1.scad>

function togmod1__make_nd_vector_adder(origin=[0,0]) =
	let(origin_is_zero = tal1_reduce(true, origin, function(prev,item) prev && item == 0))
	origin_is_zero ? (function(vec) len(vec) >= len(origin) ? vec : tal1_replace_at(origin, 0, vec)) :
	function(vec) [
		for(i=[0:1:max(len(origin),len(vec))-1]) (len(vec) > i ? vec[i] : 0) + (len(origin) > i ? origin[i] : 0),
	];

assert([1,2,3] == togmod1__make_nd_vector_adder()([1,2,3]));
assert([1,2,3] == togmod1__make_nd_vector_adder([0,0,3])([1,2]));


function togmod1_make_cuboid(size) =
	assert(is_list(size))
	assert(len(size) >= 3)
	assert(is_num(size[0]))
	assert(is_num(size[1]))
	assert(is_num(size[2]))
	["polyhedron-vf", [
		[-size[0]/2, -size[1]/2, -size[2]/2],
		[+size[0]/2, -size[1]/2, -size[2]/2],
		[-size[0]/2, +size[1]/2, -size[2]/2],
		[+size[0]/2, +size[1]/2, -size[2]/2],
		[-size[0]/2, -size[1]/2, +size[2]/2],
		[+size[0]/2, -size[1]/2, +size[2]/2],
		[-size[0]/2, +size[1]/2, +size[2]/2],
		[+size[0]/2, +size[1]/2, +size[2]/2]
	], [
		[0,1,3,2],[0,4,5,1],[4,6,7,5],[3,7,6,2],[1,5,7,3],[6,4,0,2]
	]];

function togmod1_make_polygon(verts) =
	["polygon-vp", verts, [[for( i=[0:1:len(verts)-1] ) i%len(verts)]]];

function togmod1_rounded_rect_points(size, r, pos=[0,0], simplify_rounded_sides=false) =
	assert(is_list(size))
	assert(len(size) >= 2)
	let(radii = is_list(r) ? r : is_num(r) ? [r,r] : assert(false, "rounded_rect r(adius) should be list<num> or num"))
	let(rx = radii[0])
	let(ry = radii[1])
	assert(is_num(rx))
	assert(is_num(ry))
	assert(size[0] >= 2*rx, str("size[0] must be >= 2*r[0]; size[0] = ",size[0],", 2*r[0] = ",2*rx))
	assert(size[1] >= 2*ry, str("size[1] must be >= 2*r[1]; size[1] = ",size[1],", 2*r[1] = ",2*ry))
	let(quarterfn=max($fn/4, 1))
	let(qfnx = simplify_rounded_sides && size[0] == 2*rx ? quarterfn-1 : quarterfn)
	let(qfny = simplify_rounded_sides && size[1] == 2*ry ? quarterfn-1 : quarterfn)
	let(finalizepos = togmod1__make_nd_vector_adder(pos))
[
	for(a=[0 : 1 : qfnx]) let(ang=      a*90/quarterfn) finalizepos([ size[0]/2-rx + rx*cos(ang),  size[1]/2-ry + ry*sin(ang)]),
	for(a=[0 : 1 : qfny]) let(ang= 90 + a*90/quarterfn) finalizepos([-size[0]/2+rx + rx*cos(ang),  size[1]/2-ry + ry*sin(ang)]),
	for(a=[0 : 1 : qfnx]) let(ang=180 + a*90/quarterfn) finalizepos([-size[0]/2+rx + rx*cos(ang), -size[1]/2+ry + ry*sin(ang)]),
	for(a=[0 : 1 : qfny]) let(ang=270 + a*90/quarterfn) finalizepos([ size[0]/2-rx + rx*cos(ang), -size[1]/2+ry + ry*sin(ang)]),
];

function togmod1_make_rect(size) =
	togmod1_make_polygon([
		[-size[0]/2, -size[1]/2],
		[+size[0]/2, -size[1]/2],
		[+size[0]/2, +size[1]/2],
		[-size[0]/2, +size[1]/2],
	]);

function togmod1_make_rounded_rect(size, r) =
	r == 0 ? togmod1_make_rect(size) :
	togmod1_make_polygon(togmod1_rounded_rect_points(size,r,simplify_rounded_sides=true));

/**
 * Returns points for an approximation of a circle where points are at distance r from pos.
 * Can be used to make other regular polygons, but the faces will be less than that
 * distance from pos (do some trig if you want face distance, e.g. for a hex nut).
 */
function togmod1_circle_points(r, pos=[0,0], d=undef) =
	assert( !is_undef(r) || !is_undef(d) )
	assert(!is_undef(pos[0]))
	assert(!is_undef(pos[1]))
	let(finalizepos = togmod1__make_nd_vector_adder(pos))
	let(r_ = !is_undef(r) ? r : d/2)
	let(fn = max($fn, 3))
	[for(i=[0 : 1 : fn-1]) finalizepos([r_*cos(i*360/fn), r_*sin(i*360/fn)])];

function togmod1_make_circle(r, pos=[0,0], d=undef) =
	r == 0 || d == 0 ? ["union"] :
	togmod1_make_polygon(togmod1_circle_points(r=r, pos=pos, d=d));

function togmod1_make_cylinder(d, zrange=[0,1], r=undef, pos=[0,0]) =
	assert( !is_undef(r) || !is_undef(d) )
	let( r_ = !is_undef(r) ? r : d/2 )
	// TODO: Make polyhedron directly
	["linear-extrude-zs", zrange, togmod1_make_circle(r=r_, pos=pos)];

function togmod1__is_range1d(range) = is_list(range) && len(range) == 2 && is_num(range[0]) && is_num(range[1]);

function togmod1_linear_extrude_z(range, shape) =
	assert(togmod1__is_range1d(range))
	["linear-extrude-zs", range, shape];
function togmod1_linear_extrude_x(range, shape) =
	assert(togmod1__is_range1d(range))
	["rotate", [90, 0, 90], togmod1_linear_extrude_z(range, shape)];
function togmod1_linear_extrude_y(range, shape) =
	assert(togmod1__is_range1d(range))
	["rotate", [90, 0,  0], togmod1_linear_extrude_z([-range[1], -range[0]], shape)];

function togmod1_text(text, size, font, halign, valign, spacing, direction, language, script) =
	["text-tsfhvsdls", text, size, font, halign, valign, spacing, direction, language, script];
// file: ../lib/TOGMod1.scad
// TOGMod1.9
// OpenSCAD library for representing shapes
// 
// See also: Functional OpenSCAD (https://github.com/thehans/FunctionalOpenSCAD)
// 
// v1.8:
// - Add `text-tsfhvsdls`
// v1.9
// - Add `offset-ds` (offset with _d_elta a _s_hape)

module togmod1_domodule(mod) {
	assert(is_list(mod));
	assert(len(mod) > 0);
	if( mod[0] == "polygon-vp" ) {
		// ["polygon-vp", vertexes, paths]
		polygon(points=mod[1], paths=mod[2]);
	} else if( mod[0] == "polyhedron-vf" ) {
		polyhedron(mod[1], faces=mod[2]);
	} else if( mod[0] == "scale" ) {
		assert(len(mod) == 3);
		scale(mod[1]) togmod1_domodule(mod[2]);
	} else if( mod[0] == "translate" ) {
		assert(len(mod) == 3);
		assert(is_list(mod[1]));
		for(c=mod[1]) assert(is_num(c), "translate component should be numeric");
		translate(mod[1]) togmod1_domodule(mod[2]);
	} else if( mod[0] == "rotate" ) {
		assert(len(mod) == 3);
		rotate(mod[1]) togmod1_domodule(mod[2]);
	} else if( mod[0] == "intersection" ) {
		intersection_for( i=[1:1:len(mod)-1] ) togmod1_domodule(mod[i]);
	} else if( mod[0] == "difference" ) {
		difference() {
			togmod1_domodule(mod[1]);
			for( i=[2:1:len(mod)-1] ) togmod1_domodule(mod[i]);
		}
	} else if( mod[0] == "union" ) {
		for( i=[1:1:len(mod)-1] ) togmod1_domodule(mod[i]);
	} else if( mod[0] == "hull" ) {
		hull() for( i=[1:1:len(mod)-1] ) togmod1_domodule(mod[i]);
	} else if( mod[0] == "offset-rs" ) {
		assert(len(mod) == 3);
		assert(is_num(mod[1]));
		assert(is_list(mod[2]));
		offset(mod[1]) togmod1_domodule(mod[2]);
	} else if( mod[0] == "linear-extrude-zs" ) {
		// ["linear-extrude-zs", [z0,z1], 2d_shape] // centered
		// ["linear-extrude-zs", height, 2d_shape]
		let( zrange = is_list(mod[1]) ? mod[1] : [-mod[1]/2, mod[1]/2] ) {
			translate([0,0,zrange[0]]) linear_extrude(zrange[1]-zrange[0]) togmod1_domodule(mod[2]);
		}
	} else if( mod[0] == "render" ) {
		render() togmod1_domodule(mod[1]);
	} else if( mod[0] == "minkowski" ) {
		minkowski() {
			togmod1_domodule(mod[1]);
			togmod1_domodule(mod[2]);
		}
	} else if( mod[0] == "x-debug" ) {
		# togmod1_domodule(mod[1]);
	} else if( mod[0] == "x-color" ) {
		color(mod[1]) togmod1_domodule(mod[2]);
	} else if( mod[0] == "text-tsfhvsdls" ) {
		text(text=mod[1], size=mod[2], font=mod[3], halign=mod[4], valign=mod[5], spacing=mod[6], direction=mod[7], language=mod[7], script=mod[8]);
	} else if( mod[0] == "offset-ds" ) {
		assert(is_num(mod[1]));
		assert(is_list(mod[2]));
		offset(delta=mod[1]) togmod1_domodule(mod[2]);
	} else {
		assert(false, str("Unrecognized shape: ", mod[0]));
	}
}
// main file
// Bookmark0.2
// 
// v0.2:
// - Add options for slot_width, length, outer_offset, and corner_radius
// - Fix to actually mind width option

thickness = "0.4mm";
width = "1.5inch";
length = "6inch";
corner_radius = "1/2inch";
slot_width = "4mm";

slot_inset_x = "1/4inch";
slot_inset_y = "1/2inch";

$fn = 48;
// Extend the outer edges outward by this much
outer_offset = "-0.1mm";

use <../lib/TOGMod1.scad>
use <../lib/TOGMod1Constructors.scad>
use <../lib/TOGPath1.scad>
use <../lib/TOGUnits1.scad>

outer_offset_mm  = togunits1_decode(outer_offset);
thickness_mm     = togunits1_decode(thickness);
width_mm         = togunits1_decode(width);
length_mm        = togunits1_decode(length);
corner_radius_mm = togunits1_decode(corner_radius);
slot_width_mm    = togunits1_decode(slot_width);
slot_inset_x_mm  = togunits1_decode(slot_inset_x);
slot_inset_y_mm  = togunits1_decode(slot_inset_y);

togmod1_domodule(togmod1_linear_extrude_z([0, thickness_mm], ["difference",
	togmod1_make_rounded_rect([width_mm + outer_offset_mm*2, length_mm + outer_offset_mm*2], r=corner_radius_mm + outer_offset_mm),
	
	togpath1_rath_to_polygon(togpath1_polyline_to_rath(togpath1_rath_to_polypoints(["togpath1-rath",
		["togpath1-rathnode", [-width_mm/2+slot_inset_x_mm,  length_mm/2-slot_inset_y_mm]],
		["togpath1-rathnode", [-width_mm/2+slot_inset_x_mm, -length_mm/2+slot_inset_y_mm], ["round", 6.35]],
		["togpath1-rathnode", [ width_mm/2-slot_inset_x_mm, -length_mm/2+slot_inset_y_mm], ["round", 6.35]],
		["togpath1-rathnode", [ width_mm/2-slot_inset_x_mm,  length_mm/2-slot_inset_y_mm]],
	]), r=slot_width_mm/2)),
]));
